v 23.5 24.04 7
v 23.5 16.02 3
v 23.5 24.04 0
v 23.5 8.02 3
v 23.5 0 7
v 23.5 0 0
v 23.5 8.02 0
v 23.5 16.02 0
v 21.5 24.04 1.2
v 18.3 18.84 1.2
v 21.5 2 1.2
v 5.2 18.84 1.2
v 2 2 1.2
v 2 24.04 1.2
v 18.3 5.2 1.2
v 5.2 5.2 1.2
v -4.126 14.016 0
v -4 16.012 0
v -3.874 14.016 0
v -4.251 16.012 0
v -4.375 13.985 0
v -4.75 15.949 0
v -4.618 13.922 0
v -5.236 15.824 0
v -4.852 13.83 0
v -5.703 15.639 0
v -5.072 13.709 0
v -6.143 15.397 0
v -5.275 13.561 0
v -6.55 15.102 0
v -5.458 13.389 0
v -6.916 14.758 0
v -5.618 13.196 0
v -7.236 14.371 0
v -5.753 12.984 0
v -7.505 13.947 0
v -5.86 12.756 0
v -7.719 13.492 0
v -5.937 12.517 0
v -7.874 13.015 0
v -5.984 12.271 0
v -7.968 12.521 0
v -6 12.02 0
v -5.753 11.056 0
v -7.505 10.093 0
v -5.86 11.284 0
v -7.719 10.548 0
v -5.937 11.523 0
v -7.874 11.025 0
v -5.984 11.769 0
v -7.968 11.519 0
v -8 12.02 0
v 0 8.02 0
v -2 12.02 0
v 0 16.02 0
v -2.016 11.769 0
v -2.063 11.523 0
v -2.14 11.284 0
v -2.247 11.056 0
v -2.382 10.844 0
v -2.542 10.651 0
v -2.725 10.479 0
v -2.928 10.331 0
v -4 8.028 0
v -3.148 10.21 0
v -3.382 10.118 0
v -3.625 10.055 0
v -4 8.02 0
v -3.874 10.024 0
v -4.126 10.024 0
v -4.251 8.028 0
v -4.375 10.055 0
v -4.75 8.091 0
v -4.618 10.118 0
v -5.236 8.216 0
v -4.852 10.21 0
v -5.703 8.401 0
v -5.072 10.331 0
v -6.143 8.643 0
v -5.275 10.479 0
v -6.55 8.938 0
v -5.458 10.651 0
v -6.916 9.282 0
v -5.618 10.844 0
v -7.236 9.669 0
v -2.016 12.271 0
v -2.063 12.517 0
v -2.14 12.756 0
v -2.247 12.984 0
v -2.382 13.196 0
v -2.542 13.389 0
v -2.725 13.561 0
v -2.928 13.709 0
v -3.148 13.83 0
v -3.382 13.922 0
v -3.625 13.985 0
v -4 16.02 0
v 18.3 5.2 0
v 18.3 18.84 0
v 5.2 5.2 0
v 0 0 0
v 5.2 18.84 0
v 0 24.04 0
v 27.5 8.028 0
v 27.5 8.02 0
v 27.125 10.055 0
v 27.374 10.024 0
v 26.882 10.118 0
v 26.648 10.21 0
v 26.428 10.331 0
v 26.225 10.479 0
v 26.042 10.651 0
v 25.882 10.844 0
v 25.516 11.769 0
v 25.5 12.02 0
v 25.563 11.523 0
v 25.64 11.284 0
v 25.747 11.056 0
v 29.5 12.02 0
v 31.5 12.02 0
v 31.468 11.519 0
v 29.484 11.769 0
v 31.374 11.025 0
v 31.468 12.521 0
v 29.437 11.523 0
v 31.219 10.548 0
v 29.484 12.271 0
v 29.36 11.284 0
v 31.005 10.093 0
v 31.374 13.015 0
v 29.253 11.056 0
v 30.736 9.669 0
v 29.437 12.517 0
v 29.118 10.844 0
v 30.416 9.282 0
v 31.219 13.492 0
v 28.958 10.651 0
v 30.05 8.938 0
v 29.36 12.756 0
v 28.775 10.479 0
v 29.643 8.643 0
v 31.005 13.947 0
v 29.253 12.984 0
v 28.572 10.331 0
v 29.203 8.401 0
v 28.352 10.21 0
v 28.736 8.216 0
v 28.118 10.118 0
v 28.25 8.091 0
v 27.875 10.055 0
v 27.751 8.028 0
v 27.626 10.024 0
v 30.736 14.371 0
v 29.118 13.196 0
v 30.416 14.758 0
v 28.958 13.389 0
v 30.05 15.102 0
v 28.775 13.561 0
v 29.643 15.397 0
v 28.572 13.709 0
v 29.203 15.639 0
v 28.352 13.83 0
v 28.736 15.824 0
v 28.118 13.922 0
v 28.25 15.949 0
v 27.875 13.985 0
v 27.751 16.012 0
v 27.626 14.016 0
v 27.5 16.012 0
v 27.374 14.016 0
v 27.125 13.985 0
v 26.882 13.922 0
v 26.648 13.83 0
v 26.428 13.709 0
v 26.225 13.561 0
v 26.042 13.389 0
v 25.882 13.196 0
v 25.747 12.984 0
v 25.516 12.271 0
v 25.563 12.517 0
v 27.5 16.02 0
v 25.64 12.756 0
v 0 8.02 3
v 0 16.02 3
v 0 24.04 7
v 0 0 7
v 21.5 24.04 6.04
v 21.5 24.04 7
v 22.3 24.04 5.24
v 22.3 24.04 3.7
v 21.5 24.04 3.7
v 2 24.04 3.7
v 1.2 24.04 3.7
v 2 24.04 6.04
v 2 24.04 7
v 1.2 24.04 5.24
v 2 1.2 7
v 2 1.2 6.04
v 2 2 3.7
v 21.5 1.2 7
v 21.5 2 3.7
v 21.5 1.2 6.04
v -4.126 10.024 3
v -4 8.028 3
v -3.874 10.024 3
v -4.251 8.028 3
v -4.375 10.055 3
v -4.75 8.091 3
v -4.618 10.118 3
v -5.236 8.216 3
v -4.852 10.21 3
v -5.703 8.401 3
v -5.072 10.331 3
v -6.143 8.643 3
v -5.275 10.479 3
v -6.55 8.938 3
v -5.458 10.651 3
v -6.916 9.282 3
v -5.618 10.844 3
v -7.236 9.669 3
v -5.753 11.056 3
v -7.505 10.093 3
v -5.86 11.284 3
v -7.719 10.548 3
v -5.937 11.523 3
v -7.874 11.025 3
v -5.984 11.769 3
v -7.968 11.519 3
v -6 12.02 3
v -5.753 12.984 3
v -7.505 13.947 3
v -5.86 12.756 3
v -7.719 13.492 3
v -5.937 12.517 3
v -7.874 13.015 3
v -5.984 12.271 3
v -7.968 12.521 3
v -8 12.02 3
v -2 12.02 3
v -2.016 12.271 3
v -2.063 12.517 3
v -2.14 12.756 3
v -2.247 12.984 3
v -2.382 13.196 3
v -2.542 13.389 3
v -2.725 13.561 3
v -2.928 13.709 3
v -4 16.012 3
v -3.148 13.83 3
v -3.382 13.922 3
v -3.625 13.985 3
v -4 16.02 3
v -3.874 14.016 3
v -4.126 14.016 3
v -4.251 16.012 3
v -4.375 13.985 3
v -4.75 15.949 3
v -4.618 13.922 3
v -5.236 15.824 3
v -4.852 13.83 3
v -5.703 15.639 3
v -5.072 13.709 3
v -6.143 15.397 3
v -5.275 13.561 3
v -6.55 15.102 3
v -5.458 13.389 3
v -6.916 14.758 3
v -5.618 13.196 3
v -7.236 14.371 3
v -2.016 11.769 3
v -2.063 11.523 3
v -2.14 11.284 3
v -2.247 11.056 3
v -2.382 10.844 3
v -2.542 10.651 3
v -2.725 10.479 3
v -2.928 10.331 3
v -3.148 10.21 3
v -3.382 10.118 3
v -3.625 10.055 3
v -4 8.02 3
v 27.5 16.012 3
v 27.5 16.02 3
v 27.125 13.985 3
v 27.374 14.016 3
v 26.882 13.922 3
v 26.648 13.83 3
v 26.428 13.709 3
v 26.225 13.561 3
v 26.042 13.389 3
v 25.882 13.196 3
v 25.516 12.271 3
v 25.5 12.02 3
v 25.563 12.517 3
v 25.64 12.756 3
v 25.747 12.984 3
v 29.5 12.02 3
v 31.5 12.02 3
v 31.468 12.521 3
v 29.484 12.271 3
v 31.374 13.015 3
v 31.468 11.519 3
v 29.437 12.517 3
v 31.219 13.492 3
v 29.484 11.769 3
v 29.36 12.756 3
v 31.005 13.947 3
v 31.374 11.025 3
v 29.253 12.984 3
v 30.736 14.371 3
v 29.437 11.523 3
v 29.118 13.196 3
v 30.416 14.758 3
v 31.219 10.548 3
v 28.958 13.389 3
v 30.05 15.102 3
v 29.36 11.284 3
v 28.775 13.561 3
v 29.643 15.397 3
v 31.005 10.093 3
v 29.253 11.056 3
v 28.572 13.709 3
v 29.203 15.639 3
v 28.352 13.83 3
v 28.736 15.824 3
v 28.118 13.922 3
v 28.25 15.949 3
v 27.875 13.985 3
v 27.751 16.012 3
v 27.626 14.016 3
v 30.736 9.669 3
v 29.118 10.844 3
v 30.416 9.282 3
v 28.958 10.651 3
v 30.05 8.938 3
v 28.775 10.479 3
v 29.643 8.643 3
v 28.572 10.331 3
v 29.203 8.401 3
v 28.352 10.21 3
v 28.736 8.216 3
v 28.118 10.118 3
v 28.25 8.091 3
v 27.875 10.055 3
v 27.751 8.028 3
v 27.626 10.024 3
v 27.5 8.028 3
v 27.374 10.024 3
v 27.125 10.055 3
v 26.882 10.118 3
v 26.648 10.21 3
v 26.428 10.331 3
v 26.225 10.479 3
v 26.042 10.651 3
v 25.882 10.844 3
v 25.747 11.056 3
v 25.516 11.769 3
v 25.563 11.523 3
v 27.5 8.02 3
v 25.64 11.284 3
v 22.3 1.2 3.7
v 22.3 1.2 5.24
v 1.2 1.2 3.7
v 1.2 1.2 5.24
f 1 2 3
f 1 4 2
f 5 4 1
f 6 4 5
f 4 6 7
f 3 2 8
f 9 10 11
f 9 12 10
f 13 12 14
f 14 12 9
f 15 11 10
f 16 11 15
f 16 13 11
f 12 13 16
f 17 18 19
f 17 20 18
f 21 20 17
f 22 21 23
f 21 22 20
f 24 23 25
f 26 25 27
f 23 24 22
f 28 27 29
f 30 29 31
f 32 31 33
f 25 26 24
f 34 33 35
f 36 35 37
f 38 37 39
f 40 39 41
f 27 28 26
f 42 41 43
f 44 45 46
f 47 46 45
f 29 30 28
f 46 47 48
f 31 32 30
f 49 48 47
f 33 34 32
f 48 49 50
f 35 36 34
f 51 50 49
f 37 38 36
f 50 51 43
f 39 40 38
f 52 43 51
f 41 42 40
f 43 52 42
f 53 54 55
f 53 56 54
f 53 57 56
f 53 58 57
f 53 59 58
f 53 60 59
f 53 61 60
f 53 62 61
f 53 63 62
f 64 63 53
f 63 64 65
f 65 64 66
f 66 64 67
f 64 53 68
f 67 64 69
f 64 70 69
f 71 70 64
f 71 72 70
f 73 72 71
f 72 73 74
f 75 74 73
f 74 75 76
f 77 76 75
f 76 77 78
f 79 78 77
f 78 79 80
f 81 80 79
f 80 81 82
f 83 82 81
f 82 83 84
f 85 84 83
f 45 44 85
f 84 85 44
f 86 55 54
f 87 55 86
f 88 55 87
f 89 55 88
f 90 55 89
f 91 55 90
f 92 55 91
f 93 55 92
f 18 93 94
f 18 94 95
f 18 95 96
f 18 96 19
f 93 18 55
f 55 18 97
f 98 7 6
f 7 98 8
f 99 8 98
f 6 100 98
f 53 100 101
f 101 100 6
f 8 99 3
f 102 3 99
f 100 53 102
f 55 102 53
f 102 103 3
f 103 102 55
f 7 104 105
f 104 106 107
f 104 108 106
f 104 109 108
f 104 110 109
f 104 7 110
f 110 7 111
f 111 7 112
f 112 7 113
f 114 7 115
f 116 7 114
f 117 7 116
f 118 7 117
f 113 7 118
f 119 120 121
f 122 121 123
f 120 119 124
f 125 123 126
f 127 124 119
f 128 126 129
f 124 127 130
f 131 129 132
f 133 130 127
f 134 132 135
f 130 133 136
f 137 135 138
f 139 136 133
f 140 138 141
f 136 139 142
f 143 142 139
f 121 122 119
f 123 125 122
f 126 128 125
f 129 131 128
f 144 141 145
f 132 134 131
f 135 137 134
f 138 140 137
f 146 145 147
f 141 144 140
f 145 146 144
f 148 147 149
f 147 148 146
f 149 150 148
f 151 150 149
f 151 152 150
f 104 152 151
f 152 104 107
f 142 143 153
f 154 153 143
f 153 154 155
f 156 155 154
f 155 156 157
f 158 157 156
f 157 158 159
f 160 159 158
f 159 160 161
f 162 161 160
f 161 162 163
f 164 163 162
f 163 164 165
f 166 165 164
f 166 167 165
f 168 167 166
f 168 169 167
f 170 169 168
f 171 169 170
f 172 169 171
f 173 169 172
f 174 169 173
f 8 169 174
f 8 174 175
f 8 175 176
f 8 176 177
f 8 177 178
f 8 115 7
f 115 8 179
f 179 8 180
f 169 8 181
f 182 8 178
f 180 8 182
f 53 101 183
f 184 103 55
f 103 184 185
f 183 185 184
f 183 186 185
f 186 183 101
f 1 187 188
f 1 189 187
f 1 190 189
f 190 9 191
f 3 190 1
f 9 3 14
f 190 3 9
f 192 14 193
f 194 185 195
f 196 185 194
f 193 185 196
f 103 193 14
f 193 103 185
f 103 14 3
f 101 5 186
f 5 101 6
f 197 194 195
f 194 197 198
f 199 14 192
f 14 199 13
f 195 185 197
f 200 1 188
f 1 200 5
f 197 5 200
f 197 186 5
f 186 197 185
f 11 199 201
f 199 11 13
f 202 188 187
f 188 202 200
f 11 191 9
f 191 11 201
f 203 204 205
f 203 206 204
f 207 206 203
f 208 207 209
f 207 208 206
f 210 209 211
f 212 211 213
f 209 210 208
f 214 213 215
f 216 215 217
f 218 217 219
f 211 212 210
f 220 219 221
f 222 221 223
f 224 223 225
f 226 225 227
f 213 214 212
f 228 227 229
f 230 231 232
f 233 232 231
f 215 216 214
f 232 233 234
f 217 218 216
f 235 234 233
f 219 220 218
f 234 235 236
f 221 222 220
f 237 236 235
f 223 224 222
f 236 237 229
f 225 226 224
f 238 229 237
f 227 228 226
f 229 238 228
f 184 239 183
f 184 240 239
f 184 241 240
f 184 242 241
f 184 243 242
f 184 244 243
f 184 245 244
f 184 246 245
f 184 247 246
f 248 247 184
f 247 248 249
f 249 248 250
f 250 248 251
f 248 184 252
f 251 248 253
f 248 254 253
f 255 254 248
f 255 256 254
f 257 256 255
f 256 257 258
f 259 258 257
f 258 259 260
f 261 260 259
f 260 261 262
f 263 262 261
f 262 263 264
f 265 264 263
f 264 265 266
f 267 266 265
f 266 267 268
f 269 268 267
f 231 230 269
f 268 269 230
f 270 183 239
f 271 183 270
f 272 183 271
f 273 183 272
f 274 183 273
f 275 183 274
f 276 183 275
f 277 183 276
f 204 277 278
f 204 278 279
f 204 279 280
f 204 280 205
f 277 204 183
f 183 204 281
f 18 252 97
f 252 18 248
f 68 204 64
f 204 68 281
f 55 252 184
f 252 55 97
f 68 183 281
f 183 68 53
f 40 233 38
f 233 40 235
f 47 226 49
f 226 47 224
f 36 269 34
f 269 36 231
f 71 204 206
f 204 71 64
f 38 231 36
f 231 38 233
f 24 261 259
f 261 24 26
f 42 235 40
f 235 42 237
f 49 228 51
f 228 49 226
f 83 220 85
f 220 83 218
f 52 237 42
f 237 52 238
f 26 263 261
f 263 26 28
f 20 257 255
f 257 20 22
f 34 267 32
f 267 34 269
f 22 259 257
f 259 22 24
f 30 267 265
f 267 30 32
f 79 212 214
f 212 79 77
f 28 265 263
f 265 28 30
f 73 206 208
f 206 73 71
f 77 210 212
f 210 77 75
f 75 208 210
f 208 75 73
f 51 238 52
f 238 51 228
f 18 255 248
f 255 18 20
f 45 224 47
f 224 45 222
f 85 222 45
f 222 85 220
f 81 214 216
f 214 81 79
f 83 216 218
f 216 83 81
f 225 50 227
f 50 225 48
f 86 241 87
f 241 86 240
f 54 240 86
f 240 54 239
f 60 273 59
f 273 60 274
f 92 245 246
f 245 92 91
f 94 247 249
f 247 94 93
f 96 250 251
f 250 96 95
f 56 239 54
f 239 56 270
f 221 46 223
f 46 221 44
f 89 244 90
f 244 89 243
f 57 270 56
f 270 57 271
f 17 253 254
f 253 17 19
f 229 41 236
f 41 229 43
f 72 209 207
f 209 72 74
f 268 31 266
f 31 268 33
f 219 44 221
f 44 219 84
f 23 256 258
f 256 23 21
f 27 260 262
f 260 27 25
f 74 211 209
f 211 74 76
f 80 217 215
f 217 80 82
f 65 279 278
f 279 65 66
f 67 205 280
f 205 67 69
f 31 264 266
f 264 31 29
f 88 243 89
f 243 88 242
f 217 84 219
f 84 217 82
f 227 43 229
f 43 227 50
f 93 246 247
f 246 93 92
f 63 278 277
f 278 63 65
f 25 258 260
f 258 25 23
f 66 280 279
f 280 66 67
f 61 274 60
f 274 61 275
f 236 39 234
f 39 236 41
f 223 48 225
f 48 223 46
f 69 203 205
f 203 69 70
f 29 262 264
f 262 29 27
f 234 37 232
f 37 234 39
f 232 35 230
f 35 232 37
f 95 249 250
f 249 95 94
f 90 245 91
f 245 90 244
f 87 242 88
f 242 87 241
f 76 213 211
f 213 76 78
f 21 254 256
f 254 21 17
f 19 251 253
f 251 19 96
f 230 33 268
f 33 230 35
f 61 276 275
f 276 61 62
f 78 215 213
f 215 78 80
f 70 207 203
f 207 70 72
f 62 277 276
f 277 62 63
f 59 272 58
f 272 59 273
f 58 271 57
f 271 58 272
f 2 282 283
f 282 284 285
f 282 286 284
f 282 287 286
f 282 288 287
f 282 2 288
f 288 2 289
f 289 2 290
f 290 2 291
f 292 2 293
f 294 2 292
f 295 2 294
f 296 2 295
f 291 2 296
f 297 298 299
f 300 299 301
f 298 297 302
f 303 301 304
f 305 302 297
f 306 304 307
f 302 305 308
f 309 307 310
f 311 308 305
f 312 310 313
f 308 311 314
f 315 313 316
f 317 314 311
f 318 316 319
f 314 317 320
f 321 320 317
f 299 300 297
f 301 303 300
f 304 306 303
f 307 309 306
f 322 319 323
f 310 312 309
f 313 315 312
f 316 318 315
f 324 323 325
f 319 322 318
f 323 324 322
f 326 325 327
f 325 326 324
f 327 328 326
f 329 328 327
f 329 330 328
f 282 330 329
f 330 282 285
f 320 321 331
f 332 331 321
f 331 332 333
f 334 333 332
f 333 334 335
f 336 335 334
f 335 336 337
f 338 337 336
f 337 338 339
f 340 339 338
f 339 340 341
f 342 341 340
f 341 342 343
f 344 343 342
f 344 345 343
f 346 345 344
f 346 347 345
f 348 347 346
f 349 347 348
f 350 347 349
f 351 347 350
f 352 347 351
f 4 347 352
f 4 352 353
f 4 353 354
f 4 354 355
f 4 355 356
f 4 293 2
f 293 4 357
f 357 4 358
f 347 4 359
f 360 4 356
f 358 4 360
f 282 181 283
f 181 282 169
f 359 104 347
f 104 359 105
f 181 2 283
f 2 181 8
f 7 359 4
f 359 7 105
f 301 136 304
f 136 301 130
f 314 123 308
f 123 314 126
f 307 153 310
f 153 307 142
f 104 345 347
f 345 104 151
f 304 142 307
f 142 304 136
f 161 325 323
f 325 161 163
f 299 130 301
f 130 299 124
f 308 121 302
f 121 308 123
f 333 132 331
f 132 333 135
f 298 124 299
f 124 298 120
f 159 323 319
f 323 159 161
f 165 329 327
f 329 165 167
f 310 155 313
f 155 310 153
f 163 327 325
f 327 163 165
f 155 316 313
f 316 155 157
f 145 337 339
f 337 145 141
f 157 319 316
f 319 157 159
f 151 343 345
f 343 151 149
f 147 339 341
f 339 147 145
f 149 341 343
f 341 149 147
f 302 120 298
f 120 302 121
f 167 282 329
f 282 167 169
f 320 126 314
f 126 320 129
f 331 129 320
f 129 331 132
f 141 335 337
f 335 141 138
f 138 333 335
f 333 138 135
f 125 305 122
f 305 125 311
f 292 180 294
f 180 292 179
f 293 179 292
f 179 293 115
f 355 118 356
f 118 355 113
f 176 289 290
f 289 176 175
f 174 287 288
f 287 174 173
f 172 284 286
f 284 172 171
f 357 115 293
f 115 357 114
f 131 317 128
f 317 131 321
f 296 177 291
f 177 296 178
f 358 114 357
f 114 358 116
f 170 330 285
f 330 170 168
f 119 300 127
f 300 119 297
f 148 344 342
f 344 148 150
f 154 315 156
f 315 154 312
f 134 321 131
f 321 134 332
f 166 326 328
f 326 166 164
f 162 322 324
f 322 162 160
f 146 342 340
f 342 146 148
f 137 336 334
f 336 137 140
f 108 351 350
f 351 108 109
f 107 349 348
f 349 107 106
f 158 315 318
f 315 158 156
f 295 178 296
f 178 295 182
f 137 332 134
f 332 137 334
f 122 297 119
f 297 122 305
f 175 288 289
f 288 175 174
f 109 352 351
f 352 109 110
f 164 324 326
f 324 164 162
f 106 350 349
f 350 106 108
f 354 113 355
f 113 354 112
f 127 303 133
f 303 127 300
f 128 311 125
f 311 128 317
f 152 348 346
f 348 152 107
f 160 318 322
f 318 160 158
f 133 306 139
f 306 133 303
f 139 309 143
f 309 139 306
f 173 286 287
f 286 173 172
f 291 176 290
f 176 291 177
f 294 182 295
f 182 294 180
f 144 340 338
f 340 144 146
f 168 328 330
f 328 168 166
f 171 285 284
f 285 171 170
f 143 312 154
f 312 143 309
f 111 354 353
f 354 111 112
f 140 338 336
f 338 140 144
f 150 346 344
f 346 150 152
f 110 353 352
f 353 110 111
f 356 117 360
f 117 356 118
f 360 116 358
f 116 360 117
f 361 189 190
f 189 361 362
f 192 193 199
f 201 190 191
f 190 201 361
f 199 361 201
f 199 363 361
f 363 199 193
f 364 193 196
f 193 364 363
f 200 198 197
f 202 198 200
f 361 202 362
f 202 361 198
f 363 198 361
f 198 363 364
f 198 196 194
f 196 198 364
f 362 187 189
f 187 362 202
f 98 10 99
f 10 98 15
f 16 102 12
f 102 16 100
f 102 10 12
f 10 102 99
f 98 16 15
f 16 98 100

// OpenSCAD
// file: ../lib/pcb_led_cvf.scad
// for led power module modified

/* bluetooth_mate_holder.scad
 * By John Biehler - November 17, 2011
 * http://www.thingiverse.com/thing:

 * derived from pcb_box_slide_with_tabs.scad
 * By Nicholas C Lewis - Jan 1, 2011
 * http://www.thingiverse.com/thing:5396
 *
 * derived from pcb_box_slide.scad
 *     Parametric, open PCB-box (slide-in) by chlunde
 *     http://www.thingiverse.com/thing:4071
 *
 * CHANGES
 * - adjusted to fit Arduino Mega
 * - added mounting tabs
 * - turned off cutouts
 * - adjusted bottom cutout size
 */

$fn=50;

module pcb_led_cvf(

	pcb_width = 48.2,
	pcb_length =24.1,
	pcb_height =1.1,
	slisse = 0.8,

	pcb_bottom_margin = 1,
	wall_width_thick = 2,
	box_height = 7,

	//tab parameters
	tab_hole_radius=2,
	tab_outer_radius=4,

	inner_margin = 4,

	add_tabs = true

) {
	wall_width = wall_width_thick-slisse;

module tab() {
	difference(){
		union() {
			translate([-tab_outer_radius,-tab_outer_radius,0])
			cube([tab_outer_radius,2*tab_outer_radius,wall_width_thick+1]);
			translate([-tab_outer_radius,0,0])
				cylinder(r=tab_outer_radius, h = wall_width_thick+1);
		}
		translate([-tab_outer_radius,0,0]) {
			cylinder(r= tab_hole_radius, h = wall_width_thick+5,center=true);
		}
	}

}

module box() {
	union() {
		cube([pcb_width + 2*wall_width, pcb_length + 2*wall_width, wall_width]);

		cube([wall_width_thick, pcb_length + 2*wall_width, box_height]);

		cube([pcb_width + 2*wall_width, wall_width_thick, box_height]);

		%translate([0, pcb_length+wall_width, 0])
			cube([pcb_width + 2*wall_width,wall_width,box_height]);

		translate([pcb_width + wall_width - slisse,0,0])
			cube([wall_width_thick, pcb_length + 2*wall_width, box_height]);
	}
	if(add_tabs) {
//comment out this part to remove tabs
		for(i=[(pcb_length + 2*wall_width)/2]){
	translate([0,i,0])tab();
	translate([pcb_width + 2*wall_width,i,0])mirror()tab();
		}
	}

}

module pcb() {
	translate([wall_width, wall_width, wall_width + pcb_bottom_margin])
		cube([pcb_width,pcb_length + wall_width + 0.1,pcb_height]);
	translate([wall_width, wall_width, wall_width + pcb_bottom_margin+pcb_height])rotate([0,45,0])
		cube([pcb_height,pcb_length + wall_width + 0.1,pcb_height]);
	translate([wall_width+pcb_width-2*cos(45)*pcb_height, wall_width, wall_width + pcb_bottom_margin+pcb_height])rotate([0,45,0])
		cube([pcb_height,pcb_length + wall_width + 0.1,pcb_height]);
	translate([wall_width_thick, wall_width, wall_width + pcb_bottom_margin])
		cube([pcb_width-2*slisse,pcb_length + wall_width + 0.1,box_height]);

}



module holes() {
		*translate([wall_width + pcb_width/2, wall_width_thick + 0.1, pcb_width/2+wall_width])
			rotate(a=90,v=[1,0,0])
				cylinder(r=pcb_width/2, h=wall_width_thick + 0.2);

		*translate([-0.1, wall_width + pcb_length/2, pcb_length/2 + wall_width])
			rotate(a=90,v=[0,1,0])
				cylinder(r=pcb_length/2, h=wall_width_thick + 0.2);

		*translate([pcb_width + wall_width - slisse - 0.1, wall_width + pcb_length/2, pcb_length/2 + wall_width])
			rotate(a=90,v=[0,1,0])
				cylinder(r=pcb_length/2, h=wall_width_thick + 0.2);

	 * translate([pcb_width/2 + wall_width, wall_width + pcb_length/2, -0.1])
			rotate(a=0,v=[0,1,0])
				cylinder(r=min(pcb_length,pcb_width)/2 - wall_width/2, h=wall_width_thick + 0.2);

		translate([inner_margin +wall_width, inner_margin+wall_width, -0.1])
			cube([pcb_width-inner_margin*2,pcb_length -inner_margin*2,wall_width + 0.2]);
}

	difference() {
		box();
		pcb();
		holes();
	}
}



pcb_led_cvf();
// main file
use <../lib/pcb_led_cvf.scad>


pcb_led_cvf(
  pcb_length=21.64,
  pcb_width=21.1,
  pcb_height=1.54,
  pcb_bottom_margin=2.5
);
